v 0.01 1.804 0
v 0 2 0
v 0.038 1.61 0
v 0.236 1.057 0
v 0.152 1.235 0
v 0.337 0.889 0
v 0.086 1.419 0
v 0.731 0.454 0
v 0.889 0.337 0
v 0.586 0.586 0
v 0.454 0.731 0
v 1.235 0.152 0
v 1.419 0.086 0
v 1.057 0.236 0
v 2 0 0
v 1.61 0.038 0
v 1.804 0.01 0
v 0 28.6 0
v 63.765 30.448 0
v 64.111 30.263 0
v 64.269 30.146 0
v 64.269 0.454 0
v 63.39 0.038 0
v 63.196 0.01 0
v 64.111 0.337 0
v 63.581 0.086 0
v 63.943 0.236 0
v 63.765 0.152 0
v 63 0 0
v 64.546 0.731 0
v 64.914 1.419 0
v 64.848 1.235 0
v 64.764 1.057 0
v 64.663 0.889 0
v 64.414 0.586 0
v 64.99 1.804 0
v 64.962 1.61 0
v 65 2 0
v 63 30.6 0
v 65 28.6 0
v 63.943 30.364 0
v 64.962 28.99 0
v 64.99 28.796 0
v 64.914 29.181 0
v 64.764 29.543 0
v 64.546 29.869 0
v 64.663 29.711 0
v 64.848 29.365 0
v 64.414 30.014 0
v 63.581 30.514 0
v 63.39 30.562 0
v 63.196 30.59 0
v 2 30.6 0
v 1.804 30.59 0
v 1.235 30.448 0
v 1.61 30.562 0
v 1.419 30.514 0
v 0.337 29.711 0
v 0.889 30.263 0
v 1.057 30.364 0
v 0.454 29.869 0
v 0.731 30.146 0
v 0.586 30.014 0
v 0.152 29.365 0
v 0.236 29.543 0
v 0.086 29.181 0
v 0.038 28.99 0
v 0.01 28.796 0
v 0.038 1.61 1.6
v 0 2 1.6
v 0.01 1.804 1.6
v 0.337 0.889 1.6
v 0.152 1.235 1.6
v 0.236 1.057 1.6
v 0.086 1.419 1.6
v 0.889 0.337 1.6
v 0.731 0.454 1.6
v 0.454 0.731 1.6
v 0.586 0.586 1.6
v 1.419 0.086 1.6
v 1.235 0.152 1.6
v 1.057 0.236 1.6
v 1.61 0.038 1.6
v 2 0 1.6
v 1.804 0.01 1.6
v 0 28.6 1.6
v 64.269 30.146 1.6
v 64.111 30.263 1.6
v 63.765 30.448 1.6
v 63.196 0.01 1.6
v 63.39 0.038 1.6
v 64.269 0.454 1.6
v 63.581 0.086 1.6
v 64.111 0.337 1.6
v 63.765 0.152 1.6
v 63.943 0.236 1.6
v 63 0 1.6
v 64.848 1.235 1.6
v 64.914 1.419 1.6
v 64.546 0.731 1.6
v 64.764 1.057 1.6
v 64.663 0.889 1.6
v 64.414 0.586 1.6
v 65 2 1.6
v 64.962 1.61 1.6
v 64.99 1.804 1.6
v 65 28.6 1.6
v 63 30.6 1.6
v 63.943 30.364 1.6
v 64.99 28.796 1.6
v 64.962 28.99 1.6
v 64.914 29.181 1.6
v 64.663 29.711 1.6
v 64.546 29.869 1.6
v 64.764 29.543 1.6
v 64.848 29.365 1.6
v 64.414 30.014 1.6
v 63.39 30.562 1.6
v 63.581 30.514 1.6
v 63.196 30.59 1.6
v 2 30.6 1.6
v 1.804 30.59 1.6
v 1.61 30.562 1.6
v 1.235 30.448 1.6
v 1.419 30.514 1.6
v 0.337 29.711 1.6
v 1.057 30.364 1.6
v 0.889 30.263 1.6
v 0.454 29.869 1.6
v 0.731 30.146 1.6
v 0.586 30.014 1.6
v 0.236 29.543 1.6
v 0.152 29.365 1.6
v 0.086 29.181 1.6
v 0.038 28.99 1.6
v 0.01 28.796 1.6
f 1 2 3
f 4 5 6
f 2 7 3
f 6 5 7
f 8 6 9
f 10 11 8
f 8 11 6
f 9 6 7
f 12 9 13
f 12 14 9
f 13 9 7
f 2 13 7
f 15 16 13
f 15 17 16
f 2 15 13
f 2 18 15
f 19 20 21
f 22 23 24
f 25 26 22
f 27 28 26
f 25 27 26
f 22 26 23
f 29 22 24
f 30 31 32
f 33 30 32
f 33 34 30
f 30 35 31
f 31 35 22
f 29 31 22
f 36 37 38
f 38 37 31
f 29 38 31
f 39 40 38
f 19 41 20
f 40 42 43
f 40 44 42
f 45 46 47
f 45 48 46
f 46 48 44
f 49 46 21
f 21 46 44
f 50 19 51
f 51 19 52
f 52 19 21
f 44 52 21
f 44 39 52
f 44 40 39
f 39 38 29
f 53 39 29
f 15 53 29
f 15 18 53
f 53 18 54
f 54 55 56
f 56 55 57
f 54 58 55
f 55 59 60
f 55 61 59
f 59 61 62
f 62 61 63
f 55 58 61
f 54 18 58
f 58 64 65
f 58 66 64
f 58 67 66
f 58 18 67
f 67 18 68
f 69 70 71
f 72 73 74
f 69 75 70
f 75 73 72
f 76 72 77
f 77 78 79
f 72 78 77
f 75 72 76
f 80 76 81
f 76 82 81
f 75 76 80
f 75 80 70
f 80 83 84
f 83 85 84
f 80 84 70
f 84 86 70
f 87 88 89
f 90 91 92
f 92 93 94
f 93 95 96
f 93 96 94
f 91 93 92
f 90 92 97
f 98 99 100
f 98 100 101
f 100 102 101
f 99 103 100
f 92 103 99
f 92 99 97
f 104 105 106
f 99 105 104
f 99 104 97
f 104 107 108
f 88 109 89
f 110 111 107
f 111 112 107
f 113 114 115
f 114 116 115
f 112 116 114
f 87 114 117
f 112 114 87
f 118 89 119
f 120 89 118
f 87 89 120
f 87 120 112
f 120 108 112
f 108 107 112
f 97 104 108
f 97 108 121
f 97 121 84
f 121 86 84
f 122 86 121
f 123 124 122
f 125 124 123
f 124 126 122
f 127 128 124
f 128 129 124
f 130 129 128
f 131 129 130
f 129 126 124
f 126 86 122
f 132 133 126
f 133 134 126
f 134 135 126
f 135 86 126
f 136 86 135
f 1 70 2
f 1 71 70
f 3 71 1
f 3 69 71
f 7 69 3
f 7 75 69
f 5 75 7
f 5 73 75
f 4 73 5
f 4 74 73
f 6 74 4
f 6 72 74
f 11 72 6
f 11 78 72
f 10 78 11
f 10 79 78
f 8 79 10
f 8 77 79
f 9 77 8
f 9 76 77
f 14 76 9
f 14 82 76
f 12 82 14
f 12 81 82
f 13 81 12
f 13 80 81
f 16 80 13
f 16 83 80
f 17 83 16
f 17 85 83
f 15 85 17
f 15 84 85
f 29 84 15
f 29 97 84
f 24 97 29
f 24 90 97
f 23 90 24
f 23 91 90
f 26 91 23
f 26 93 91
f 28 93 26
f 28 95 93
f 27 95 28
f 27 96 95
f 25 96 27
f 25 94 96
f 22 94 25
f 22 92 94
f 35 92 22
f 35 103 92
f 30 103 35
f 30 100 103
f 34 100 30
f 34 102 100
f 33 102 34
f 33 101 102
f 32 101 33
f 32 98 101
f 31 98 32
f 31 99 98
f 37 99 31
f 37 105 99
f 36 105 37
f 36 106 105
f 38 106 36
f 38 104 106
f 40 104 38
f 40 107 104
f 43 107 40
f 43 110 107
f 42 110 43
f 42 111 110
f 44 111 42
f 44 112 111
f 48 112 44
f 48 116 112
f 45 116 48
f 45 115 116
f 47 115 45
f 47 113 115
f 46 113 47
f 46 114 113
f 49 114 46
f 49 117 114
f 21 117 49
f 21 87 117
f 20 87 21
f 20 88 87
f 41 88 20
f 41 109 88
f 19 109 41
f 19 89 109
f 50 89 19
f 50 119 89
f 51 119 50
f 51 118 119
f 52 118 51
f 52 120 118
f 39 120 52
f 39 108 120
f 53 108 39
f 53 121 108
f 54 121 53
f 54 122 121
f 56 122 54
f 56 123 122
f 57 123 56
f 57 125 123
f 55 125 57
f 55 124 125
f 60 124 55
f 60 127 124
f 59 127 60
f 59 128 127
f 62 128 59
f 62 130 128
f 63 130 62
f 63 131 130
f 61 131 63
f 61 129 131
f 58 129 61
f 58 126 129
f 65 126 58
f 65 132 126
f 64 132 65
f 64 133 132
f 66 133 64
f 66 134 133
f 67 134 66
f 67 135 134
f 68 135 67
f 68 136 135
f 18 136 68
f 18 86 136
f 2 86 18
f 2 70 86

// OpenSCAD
$fn = 64;

board_x = 65.0;
board_y = 30.6;
board_th = 1.6;

corner_r = 2.0;

module rounded_rect_2d(x, y, r) {
    r2 = min(r, min(x, y)/2);
    hull() {
        translate([ r2,      r2]) circle(r=r2);
        translate([ x-r2,    r2]) circle(r=r2);
        translate([ r2,   y-r2]) circle(r=r2);
        translate([ x-r2, y-r2]) circle(r=r2);
    }
}

color([0.05, 0.35, 0.12])
linear_extrude(height=board_th)
rounded_rect_2d(board_x, board_y, corner_r);
